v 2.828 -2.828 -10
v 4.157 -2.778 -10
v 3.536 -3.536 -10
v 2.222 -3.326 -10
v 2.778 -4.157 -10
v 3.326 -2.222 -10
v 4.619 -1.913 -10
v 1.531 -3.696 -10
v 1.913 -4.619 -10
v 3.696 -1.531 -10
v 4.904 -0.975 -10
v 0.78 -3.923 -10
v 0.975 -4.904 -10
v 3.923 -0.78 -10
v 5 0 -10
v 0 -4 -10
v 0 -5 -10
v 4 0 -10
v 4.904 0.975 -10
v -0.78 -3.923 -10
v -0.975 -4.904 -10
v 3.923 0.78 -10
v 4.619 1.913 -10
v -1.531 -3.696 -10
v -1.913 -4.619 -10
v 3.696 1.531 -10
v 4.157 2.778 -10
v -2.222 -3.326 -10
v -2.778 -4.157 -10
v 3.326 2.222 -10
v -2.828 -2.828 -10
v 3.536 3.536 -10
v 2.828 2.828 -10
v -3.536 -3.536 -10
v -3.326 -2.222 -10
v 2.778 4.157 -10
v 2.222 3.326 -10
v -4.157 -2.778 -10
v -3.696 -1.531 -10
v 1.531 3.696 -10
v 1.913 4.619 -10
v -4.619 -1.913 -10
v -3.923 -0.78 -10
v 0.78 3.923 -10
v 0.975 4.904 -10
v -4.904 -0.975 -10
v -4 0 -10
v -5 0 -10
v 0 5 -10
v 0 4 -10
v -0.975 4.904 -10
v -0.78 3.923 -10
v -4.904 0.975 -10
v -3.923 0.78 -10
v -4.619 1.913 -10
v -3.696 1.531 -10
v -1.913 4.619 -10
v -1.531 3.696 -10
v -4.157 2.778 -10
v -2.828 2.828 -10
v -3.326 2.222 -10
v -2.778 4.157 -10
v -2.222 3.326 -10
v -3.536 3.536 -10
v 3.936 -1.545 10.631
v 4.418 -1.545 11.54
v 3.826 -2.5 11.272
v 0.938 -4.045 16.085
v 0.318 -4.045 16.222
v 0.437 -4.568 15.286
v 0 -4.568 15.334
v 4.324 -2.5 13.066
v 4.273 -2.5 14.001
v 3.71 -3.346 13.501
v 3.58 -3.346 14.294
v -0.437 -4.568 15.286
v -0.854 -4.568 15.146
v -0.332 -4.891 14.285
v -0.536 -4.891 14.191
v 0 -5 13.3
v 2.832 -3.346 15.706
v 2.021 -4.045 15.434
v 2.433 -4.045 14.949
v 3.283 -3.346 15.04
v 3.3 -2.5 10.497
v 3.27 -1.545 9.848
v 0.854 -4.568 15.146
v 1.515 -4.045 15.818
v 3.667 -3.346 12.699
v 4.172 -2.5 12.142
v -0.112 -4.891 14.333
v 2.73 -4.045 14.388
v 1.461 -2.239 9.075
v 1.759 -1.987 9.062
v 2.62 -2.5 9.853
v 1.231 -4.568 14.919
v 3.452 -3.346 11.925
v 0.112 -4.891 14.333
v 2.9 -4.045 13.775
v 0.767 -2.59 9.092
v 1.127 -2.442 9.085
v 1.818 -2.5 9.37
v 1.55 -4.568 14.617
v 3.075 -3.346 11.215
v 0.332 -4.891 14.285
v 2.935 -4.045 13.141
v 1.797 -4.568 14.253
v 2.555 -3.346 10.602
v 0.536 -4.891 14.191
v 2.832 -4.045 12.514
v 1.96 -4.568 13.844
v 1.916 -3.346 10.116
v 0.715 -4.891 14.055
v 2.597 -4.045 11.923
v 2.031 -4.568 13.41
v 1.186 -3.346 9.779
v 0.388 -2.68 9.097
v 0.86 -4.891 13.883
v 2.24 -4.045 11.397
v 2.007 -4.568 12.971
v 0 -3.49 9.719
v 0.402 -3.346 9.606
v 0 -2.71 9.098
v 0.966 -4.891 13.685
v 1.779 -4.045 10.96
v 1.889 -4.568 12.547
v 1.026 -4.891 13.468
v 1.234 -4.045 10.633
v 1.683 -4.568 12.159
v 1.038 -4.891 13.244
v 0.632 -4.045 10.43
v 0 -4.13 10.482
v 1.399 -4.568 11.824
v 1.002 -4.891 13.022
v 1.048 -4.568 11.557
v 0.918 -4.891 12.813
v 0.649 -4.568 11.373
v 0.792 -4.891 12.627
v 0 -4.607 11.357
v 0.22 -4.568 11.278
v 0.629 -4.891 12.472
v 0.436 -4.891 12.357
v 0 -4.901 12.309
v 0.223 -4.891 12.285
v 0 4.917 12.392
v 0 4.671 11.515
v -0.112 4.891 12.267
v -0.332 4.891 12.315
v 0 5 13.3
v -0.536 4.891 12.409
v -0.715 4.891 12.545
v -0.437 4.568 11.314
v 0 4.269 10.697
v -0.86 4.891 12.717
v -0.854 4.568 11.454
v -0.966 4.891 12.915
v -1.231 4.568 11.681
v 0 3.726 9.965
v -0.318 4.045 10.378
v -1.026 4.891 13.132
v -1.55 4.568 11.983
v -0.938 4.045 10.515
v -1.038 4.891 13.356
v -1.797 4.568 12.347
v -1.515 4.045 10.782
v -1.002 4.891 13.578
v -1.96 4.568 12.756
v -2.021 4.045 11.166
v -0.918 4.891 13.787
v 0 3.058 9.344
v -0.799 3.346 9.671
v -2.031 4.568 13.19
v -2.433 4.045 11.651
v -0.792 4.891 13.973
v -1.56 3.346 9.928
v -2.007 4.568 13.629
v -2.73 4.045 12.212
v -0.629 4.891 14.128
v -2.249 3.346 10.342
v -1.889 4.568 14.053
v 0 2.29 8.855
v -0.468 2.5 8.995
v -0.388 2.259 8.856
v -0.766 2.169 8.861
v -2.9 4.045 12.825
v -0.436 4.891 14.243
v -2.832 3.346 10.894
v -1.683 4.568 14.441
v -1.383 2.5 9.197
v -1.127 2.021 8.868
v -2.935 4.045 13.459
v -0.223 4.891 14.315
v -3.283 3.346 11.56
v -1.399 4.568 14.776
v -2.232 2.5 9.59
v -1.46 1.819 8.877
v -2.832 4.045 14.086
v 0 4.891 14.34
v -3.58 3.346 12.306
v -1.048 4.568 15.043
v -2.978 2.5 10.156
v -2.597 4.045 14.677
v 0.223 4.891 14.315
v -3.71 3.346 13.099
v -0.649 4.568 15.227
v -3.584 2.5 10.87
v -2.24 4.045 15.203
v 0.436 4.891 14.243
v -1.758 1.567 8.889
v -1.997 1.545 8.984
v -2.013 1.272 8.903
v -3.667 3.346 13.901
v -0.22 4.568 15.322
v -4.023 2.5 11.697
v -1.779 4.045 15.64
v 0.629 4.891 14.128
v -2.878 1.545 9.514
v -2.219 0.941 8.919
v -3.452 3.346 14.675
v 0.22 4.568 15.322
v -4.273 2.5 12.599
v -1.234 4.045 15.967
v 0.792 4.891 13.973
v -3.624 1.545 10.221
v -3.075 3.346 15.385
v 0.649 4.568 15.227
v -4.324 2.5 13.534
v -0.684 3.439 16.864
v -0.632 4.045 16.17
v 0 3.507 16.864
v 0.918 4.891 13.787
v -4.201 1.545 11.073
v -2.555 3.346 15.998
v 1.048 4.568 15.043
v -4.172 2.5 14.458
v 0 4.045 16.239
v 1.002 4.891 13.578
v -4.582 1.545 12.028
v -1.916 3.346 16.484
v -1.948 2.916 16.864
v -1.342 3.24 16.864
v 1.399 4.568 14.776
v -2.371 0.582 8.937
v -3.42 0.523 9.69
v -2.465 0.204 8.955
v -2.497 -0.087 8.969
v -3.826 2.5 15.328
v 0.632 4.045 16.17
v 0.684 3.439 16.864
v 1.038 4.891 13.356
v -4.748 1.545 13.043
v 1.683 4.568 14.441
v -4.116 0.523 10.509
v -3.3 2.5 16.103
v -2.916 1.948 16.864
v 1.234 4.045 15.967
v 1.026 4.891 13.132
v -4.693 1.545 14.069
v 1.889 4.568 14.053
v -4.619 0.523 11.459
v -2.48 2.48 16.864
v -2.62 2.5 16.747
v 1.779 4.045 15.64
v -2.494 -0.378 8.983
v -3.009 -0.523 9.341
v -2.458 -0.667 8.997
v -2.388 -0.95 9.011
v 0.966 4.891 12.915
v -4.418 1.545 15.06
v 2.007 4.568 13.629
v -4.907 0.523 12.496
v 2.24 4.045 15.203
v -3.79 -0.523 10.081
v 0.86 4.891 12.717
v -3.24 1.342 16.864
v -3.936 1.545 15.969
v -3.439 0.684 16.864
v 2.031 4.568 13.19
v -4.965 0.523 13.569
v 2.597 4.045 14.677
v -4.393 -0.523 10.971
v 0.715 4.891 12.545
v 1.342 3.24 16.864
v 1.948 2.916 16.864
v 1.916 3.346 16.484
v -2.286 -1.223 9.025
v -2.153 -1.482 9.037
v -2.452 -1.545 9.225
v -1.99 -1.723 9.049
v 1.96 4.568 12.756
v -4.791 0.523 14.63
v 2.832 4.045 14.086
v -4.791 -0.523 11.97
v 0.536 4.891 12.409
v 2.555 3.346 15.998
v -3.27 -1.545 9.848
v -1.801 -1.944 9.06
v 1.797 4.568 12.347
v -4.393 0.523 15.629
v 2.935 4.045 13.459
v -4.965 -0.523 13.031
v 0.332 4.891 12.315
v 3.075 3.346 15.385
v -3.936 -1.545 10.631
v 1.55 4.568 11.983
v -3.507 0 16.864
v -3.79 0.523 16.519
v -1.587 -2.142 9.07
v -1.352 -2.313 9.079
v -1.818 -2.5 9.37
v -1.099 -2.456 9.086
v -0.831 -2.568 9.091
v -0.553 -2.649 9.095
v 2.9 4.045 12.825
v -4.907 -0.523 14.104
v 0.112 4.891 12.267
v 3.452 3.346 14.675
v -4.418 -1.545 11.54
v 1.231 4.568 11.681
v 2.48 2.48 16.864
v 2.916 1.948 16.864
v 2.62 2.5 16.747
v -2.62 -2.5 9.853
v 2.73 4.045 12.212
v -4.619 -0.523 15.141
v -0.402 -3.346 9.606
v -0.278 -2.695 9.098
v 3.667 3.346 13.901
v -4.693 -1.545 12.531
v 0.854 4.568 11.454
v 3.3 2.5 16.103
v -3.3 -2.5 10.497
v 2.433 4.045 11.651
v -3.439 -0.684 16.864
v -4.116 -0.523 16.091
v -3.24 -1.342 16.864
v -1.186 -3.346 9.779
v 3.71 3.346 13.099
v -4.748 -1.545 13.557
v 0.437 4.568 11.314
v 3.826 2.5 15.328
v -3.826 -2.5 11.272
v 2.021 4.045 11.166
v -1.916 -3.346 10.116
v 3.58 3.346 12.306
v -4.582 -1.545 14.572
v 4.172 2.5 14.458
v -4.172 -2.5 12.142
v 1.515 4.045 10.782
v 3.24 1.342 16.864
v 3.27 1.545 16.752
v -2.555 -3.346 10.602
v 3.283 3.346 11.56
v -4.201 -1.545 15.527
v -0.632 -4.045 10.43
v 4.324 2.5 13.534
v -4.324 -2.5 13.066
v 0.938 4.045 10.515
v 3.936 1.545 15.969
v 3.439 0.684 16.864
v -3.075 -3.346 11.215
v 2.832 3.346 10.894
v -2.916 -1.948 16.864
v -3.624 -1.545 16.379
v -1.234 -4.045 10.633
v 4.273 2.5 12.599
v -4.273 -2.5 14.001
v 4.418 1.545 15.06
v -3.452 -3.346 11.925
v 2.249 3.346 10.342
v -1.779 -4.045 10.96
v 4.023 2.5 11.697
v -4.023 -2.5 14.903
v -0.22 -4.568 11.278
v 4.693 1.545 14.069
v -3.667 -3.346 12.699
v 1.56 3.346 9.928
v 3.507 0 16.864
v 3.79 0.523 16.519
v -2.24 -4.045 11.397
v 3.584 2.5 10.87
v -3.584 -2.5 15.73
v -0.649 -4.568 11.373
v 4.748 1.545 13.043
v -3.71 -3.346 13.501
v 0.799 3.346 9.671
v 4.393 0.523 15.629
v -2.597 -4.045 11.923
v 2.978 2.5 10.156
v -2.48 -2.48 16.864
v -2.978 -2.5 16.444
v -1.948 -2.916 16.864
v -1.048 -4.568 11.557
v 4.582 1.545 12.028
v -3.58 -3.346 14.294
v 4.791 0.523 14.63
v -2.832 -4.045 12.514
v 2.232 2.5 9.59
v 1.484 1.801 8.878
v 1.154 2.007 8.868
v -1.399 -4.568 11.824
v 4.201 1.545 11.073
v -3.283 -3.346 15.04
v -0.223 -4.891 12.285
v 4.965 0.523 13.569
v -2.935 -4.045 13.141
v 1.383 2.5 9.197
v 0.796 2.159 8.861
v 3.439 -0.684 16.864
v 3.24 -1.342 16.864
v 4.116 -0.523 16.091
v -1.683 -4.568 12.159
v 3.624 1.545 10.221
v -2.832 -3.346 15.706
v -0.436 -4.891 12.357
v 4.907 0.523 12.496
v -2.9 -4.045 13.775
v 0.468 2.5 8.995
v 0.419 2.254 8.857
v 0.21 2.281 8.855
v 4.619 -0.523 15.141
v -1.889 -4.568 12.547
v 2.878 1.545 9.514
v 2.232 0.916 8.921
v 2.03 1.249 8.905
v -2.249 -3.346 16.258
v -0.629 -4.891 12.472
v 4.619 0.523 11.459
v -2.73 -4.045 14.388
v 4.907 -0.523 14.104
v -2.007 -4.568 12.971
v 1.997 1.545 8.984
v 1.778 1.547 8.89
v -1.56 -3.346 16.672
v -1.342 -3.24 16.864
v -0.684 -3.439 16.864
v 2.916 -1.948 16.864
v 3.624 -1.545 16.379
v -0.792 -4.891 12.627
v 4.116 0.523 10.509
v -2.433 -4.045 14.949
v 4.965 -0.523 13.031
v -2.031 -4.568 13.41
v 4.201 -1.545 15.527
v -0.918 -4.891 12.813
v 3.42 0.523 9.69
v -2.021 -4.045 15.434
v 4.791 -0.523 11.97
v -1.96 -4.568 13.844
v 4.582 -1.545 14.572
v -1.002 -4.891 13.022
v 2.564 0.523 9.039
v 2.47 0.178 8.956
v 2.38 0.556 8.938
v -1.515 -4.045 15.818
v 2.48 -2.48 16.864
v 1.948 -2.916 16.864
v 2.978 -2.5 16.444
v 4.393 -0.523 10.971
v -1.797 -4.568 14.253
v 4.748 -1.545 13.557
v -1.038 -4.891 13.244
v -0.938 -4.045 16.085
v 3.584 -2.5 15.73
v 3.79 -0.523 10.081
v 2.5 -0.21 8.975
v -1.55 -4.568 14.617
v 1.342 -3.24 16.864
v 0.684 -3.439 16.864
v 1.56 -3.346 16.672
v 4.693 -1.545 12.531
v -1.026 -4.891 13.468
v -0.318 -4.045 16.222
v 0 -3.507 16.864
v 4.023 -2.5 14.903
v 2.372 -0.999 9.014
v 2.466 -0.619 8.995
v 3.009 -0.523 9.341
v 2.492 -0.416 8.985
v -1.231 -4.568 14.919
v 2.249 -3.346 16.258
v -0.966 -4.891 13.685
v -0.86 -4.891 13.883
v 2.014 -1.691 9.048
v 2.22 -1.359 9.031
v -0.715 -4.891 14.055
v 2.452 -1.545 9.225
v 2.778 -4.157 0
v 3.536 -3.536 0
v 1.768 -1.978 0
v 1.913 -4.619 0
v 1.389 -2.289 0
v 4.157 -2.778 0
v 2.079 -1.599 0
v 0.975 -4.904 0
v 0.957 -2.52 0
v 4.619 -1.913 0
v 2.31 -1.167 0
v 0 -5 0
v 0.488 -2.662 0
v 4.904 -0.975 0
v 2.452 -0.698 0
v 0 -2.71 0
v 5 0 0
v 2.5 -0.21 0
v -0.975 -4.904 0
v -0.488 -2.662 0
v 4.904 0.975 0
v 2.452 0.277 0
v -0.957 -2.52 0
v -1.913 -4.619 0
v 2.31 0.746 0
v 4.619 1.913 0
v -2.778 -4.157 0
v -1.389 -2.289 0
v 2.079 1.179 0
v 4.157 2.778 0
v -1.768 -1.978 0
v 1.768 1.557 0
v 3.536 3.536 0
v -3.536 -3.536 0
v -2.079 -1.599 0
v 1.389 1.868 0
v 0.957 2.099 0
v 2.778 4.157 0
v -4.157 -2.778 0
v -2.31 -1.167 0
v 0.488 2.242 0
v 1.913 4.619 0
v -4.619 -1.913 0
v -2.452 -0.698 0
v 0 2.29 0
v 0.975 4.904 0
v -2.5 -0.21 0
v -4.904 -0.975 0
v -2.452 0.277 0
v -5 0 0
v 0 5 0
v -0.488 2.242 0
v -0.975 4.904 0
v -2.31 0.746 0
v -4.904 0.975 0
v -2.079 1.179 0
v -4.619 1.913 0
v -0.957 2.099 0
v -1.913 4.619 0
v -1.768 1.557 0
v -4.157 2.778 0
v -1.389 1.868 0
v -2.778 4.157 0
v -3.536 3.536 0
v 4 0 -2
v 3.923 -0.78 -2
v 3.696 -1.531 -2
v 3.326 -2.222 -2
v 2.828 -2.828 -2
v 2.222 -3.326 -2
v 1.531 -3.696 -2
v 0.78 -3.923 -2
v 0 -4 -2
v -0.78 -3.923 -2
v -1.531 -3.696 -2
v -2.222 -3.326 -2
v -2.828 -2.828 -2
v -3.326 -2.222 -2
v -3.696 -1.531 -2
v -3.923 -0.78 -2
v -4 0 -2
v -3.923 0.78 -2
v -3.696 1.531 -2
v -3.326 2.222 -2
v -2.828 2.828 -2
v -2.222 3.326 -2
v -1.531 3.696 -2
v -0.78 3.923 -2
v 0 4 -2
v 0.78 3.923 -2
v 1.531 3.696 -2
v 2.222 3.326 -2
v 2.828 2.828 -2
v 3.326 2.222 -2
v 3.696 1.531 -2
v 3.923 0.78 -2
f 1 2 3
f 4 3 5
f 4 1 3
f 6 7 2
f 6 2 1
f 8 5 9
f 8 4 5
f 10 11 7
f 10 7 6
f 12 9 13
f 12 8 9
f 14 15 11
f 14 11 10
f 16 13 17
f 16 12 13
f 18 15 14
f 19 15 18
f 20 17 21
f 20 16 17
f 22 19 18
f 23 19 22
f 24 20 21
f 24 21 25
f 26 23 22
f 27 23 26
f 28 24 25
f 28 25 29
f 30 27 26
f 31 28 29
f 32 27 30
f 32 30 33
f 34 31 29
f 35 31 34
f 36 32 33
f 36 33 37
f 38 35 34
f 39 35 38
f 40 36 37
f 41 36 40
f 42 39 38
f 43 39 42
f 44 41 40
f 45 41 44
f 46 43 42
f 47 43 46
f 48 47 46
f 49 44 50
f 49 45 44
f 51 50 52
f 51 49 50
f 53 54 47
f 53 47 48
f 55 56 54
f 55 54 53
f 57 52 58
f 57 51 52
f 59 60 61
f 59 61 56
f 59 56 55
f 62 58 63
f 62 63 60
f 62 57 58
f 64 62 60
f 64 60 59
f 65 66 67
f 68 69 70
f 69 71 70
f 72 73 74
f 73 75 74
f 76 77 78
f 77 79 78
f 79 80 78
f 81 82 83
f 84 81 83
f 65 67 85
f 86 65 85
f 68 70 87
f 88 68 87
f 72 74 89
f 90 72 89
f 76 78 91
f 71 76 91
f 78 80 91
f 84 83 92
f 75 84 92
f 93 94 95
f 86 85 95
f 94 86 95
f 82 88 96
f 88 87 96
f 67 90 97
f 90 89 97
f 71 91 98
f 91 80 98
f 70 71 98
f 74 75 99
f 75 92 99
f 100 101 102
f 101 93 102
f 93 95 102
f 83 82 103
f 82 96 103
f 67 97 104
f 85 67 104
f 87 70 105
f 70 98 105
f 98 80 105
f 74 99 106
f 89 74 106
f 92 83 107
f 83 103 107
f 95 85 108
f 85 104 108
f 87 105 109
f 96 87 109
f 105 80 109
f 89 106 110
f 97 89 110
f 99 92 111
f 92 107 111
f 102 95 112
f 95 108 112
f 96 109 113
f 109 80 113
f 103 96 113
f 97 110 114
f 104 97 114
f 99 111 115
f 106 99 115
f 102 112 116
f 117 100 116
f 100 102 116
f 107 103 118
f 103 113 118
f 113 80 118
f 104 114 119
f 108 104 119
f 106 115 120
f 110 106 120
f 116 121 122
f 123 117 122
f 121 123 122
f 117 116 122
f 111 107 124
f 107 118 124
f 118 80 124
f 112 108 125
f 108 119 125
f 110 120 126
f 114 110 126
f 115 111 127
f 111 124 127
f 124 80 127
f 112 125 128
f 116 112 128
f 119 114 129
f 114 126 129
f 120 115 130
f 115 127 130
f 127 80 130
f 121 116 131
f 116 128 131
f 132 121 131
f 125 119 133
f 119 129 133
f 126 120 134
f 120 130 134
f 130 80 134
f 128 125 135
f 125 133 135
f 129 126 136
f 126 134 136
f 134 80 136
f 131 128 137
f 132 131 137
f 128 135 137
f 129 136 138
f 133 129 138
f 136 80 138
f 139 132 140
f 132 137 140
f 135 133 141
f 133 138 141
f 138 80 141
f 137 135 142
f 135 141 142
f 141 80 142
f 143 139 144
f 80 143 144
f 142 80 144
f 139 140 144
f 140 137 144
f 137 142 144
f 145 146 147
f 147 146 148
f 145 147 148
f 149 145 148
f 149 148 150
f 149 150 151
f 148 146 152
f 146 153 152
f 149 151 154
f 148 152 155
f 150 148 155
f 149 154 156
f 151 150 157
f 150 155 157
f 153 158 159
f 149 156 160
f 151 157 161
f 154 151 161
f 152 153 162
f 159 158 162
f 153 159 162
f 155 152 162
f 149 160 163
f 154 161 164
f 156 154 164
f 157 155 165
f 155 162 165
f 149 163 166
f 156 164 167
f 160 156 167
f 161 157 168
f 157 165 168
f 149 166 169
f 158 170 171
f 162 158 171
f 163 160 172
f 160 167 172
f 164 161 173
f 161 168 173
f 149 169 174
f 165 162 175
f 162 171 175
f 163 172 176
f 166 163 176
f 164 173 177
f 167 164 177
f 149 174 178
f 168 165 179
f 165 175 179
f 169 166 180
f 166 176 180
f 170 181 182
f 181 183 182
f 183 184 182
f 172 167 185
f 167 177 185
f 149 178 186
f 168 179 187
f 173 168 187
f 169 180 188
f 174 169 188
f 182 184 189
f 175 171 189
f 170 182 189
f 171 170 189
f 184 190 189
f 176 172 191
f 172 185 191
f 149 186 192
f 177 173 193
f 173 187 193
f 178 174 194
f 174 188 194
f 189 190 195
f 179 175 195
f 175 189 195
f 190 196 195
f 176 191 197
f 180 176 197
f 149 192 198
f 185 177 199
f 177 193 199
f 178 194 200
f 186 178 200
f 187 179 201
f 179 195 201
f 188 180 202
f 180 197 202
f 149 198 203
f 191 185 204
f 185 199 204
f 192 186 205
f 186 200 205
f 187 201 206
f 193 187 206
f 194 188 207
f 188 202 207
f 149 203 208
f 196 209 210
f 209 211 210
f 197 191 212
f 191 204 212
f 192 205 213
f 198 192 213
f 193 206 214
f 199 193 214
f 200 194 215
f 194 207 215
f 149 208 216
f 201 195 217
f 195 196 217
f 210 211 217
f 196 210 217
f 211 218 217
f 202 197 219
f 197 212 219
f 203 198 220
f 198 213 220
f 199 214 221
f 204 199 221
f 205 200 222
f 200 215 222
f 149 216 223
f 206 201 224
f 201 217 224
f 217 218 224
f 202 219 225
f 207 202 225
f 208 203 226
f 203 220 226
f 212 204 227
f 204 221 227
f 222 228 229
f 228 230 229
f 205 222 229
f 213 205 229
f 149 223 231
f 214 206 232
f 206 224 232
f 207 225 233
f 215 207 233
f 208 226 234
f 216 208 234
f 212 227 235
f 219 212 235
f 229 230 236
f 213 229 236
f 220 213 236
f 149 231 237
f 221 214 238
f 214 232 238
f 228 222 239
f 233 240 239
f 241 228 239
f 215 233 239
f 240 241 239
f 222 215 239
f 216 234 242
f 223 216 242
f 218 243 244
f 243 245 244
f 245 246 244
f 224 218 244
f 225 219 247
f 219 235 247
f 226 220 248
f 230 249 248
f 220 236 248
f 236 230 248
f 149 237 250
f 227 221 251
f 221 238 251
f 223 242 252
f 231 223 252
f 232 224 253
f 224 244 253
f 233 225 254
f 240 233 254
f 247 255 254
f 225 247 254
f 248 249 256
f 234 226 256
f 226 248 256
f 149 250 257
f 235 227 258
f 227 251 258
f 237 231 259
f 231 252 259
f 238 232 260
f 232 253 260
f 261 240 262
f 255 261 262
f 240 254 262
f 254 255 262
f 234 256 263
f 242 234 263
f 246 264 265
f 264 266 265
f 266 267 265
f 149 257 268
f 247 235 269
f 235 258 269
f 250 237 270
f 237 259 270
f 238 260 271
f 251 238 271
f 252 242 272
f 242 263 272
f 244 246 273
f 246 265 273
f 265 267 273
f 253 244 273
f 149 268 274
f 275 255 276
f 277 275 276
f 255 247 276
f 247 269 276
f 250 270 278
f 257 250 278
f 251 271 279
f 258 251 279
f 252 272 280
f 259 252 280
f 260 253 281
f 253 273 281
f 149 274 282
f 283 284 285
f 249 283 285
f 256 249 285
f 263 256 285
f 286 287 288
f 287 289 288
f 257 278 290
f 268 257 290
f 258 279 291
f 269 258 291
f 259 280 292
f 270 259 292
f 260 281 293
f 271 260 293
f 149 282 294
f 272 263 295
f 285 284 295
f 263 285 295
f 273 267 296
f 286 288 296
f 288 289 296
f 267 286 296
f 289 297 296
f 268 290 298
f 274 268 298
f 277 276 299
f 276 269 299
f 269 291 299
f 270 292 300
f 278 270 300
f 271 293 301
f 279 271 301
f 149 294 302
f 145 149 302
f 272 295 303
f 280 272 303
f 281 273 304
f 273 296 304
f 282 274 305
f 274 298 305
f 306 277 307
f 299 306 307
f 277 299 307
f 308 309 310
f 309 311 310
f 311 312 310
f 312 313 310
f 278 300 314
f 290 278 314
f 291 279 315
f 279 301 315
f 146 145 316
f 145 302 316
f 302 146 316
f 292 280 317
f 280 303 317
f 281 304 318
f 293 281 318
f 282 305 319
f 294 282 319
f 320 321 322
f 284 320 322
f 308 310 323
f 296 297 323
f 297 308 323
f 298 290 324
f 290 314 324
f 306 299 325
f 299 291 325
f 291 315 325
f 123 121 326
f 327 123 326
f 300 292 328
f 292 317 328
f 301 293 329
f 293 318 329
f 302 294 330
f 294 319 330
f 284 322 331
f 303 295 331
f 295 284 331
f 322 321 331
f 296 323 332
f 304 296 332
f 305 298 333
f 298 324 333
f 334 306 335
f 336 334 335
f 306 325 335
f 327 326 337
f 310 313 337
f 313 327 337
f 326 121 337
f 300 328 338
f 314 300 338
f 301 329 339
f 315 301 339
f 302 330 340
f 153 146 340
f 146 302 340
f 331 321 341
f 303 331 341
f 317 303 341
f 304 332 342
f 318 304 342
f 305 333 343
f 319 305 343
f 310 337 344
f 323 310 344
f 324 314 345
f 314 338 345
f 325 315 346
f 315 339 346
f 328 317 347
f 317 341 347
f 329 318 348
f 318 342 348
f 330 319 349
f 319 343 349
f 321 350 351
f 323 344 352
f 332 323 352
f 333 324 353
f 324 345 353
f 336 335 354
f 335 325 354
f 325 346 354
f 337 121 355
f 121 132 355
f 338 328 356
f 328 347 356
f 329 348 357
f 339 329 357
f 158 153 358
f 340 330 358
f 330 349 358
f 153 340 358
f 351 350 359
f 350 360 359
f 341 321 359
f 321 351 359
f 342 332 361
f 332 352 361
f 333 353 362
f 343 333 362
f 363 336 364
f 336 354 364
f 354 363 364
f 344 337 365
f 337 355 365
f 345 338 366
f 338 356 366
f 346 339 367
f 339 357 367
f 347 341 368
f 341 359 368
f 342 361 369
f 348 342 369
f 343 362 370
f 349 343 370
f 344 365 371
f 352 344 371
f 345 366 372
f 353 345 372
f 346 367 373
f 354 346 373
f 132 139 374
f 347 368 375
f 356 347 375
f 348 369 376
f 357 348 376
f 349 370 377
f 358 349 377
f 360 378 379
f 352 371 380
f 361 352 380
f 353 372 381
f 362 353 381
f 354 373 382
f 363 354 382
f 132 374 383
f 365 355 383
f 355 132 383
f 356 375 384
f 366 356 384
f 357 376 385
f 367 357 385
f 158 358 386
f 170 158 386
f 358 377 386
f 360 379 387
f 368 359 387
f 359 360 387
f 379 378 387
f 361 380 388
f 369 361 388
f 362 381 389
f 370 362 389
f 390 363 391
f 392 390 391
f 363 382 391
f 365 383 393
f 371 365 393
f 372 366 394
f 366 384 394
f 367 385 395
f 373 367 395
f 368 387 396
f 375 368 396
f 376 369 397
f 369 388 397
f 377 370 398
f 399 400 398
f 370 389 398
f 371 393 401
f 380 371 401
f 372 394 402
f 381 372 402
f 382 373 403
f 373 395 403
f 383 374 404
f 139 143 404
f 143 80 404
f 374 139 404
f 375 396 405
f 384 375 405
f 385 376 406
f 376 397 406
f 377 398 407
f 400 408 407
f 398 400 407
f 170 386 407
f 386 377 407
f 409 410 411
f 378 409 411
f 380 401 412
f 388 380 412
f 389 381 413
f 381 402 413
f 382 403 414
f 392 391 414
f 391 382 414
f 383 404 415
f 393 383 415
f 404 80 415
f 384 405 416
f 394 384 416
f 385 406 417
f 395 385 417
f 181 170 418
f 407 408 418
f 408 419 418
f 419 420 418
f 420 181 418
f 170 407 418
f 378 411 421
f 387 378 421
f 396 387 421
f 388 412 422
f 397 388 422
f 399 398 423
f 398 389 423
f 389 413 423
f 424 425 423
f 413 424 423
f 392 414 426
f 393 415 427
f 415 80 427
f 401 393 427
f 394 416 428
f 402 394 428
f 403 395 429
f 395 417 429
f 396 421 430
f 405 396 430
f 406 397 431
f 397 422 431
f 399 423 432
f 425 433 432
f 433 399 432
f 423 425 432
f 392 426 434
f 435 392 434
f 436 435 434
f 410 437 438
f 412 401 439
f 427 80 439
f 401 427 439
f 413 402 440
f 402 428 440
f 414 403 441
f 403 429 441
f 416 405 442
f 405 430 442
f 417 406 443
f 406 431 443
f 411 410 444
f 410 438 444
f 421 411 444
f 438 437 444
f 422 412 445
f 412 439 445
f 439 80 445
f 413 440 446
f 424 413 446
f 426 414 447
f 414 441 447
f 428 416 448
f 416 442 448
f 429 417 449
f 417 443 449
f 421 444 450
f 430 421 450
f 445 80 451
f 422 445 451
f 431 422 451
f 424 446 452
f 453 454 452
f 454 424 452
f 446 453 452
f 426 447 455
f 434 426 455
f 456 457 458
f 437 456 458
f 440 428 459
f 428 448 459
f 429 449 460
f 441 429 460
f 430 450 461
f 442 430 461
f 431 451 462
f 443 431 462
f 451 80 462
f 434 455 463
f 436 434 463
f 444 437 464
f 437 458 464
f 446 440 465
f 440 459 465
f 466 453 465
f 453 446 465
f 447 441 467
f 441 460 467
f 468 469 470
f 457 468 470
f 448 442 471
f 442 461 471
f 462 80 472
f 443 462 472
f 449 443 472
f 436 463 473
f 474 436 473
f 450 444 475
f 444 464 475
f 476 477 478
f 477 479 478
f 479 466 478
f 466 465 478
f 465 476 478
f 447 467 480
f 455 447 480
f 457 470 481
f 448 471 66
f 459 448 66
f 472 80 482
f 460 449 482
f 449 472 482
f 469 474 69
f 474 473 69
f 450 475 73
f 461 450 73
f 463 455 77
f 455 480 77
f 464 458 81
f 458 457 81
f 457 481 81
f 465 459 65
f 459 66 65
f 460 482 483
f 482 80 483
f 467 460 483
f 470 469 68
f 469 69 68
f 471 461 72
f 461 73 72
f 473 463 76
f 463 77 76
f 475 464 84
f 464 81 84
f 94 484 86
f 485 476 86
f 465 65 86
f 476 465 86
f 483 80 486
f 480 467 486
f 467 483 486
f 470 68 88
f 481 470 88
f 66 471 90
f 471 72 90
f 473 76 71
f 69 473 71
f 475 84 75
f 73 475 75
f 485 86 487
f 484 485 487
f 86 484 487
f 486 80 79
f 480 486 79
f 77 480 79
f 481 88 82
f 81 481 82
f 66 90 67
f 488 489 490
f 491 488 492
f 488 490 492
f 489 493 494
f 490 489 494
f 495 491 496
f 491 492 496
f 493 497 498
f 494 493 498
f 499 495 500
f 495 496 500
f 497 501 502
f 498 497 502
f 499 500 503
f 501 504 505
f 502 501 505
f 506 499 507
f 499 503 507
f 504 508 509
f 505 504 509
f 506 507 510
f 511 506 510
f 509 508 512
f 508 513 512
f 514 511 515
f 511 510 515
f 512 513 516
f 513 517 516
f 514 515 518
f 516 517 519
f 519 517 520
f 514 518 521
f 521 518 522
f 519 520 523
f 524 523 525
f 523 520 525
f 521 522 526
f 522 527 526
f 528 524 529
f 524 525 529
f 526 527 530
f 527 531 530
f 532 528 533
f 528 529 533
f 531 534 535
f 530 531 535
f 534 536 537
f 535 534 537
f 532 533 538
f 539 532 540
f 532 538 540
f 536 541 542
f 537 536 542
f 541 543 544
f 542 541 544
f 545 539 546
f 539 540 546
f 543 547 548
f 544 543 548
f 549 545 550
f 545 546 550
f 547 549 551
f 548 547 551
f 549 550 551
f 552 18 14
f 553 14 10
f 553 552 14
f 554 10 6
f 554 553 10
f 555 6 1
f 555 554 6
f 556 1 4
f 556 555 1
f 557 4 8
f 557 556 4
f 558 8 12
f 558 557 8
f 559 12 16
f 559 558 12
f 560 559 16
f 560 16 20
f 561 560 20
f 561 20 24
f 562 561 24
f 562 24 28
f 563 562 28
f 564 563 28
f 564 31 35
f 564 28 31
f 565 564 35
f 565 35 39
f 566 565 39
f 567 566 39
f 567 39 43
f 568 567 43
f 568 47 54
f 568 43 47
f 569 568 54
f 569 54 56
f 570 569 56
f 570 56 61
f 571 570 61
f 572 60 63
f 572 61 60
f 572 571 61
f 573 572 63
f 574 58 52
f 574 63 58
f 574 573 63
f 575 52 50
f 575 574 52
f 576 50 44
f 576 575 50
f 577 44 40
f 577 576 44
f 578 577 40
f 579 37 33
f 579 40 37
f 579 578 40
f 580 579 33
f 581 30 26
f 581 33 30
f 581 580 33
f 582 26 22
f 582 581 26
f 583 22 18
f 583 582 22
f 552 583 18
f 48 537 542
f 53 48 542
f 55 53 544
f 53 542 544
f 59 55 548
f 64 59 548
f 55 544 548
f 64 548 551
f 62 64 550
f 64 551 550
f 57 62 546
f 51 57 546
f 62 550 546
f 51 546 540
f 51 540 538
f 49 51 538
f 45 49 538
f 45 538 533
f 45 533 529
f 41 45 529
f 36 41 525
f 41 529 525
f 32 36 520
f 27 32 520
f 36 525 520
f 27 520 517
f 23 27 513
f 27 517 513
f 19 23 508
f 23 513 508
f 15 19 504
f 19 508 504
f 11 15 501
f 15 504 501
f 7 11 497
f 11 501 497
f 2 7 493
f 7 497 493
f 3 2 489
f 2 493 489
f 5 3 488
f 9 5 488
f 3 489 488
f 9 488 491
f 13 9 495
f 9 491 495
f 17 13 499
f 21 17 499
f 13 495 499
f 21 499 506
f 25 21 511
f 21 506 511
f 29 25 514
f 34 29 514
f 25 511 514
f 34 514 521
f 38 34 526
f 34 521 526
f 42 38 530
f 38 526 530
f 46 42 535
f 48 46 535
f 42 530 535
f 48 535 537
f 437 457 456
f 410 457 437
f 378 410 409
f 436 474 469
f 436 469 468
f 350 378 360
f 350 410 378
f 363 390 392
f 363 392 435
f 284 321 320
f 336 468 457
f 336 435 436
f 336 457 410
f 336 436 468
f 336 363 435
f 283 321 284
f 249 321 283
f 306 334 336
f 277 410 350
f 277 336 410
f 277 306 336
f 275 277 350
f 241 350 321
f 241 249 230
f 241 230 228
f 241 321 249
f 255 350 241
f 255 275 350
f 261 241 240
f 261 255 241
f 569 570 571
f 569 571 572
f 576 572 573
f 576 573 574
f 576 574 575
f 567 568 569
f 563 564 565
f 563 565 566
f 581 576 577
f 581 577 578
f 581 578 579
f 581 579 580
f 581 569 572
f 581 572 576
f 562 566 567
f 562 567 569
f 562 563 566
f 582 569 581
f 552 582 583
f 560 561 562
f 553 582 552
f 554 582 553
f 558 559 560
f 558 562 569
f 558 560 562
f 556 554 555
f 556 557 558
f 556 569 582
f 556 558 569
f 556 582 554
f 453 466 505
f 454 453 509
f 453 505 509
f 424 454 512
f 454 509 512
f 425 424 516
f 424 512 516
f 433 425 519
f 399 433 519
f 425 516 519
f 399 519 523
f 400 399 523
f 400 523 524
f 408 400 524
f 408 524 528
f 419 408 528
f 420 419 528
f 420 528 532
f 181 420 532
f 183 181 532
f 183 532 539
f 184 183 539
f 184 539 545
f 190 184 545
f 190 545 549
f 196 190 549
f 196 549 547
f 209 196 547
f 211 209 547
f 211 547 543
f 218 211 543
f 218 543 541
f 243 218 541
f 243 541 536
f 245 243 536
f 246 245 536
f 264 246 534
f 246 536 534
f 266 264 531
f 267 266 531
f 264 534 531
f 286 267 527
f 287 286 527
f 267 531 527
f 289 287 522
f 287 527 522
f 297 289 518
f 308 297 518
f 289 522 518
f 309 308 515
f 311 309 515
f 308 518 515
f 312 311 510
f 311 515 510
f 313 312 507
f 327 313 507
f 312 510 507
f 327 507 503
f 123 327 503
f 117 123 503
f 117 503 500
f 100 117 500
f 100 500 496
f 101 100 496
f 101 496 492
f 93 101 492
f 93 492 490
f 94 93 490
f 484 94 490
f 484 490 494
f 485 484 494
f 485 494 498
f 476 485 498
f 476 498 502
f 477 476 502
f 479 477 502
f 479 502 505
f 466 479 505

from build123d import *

# Parameters (mm, degrees)
SKETCH1_R               = 2.5
BOSS_EXTRUDE1_DEPTH     = 9.1
CUT_EXTRUDE1_DEPTH      = 20.618613611
CUT_EXTRUDE1_DEPTH_BACK = 20.618613611
SKETCH4_W               = 5.29751814
SKETCH4_H               = 11.035514004
SKETCH5_R               = 5
BOSS_EXTRUDE2_DEPTH     = 10
CUT_EXTRUDE2_DEPTH      = 28.779051493
CUT_EXTRUDE2_DEPTH_BACK = 8
SKETCH6_R               = 4


with BuildPart() as part:
    # Sketch1 → Boss-Extrude1 (new body)
    with BuildSketch(Plane.XY):
        with Locations((0, -0.210420065)):
            Circle(SKETCH1_R)
    extrude(amount=BOSS_EXTRUDE1_DEPTH)

    # Sketch3 → Revolve1 (revolve)
    with BuildSketch(Plane(origin=(0, 0, 0), x_dir=(0, 0, -1), z_dir=(1, 0, 0))):
        with BuildLine():
            Line((-13.3, -5), (-13.3, 5))
            ThreePointArc((-13.3, 5), (-8.3, 0), (-13.3, -5))
        make_face()
    revolve(axis=Axis((0, -5, 13.3), (0, 1, 0)))

    # Sketch4 → Cut-Extrude1 (cut, two sides: drawn at the far end of the back side and taken through both)
    with BuildSketch(Plane(origin=(0, 0, 0), x_dir=(0, 0, -1), z_dir=(1, 0, 0)).offset(-CUT_EXTRUDE1_DEPTH_BACK)):
        with Locations((-19.512781414, 0.215959178)):
            Rectangle(SKETCH4_W, SKETCH4_H)
    extrude(amount=CUT_EXTRUDE1_DEPTH + CUT_EXTRUDE1_DEPTH_BACK, mode=Mode.SUBTRACT)

    # Sketch5 → Boss-Extrude2 (add)
    with BuildSketch(Plane(origin=(0, 0, 0), x_dir=(-1, 0, 0), z_dir=(0, 0, -1))):
        Circle(SKETCH5_R)
    extrude(amount=BOSS_EXTRUDE2_DEPTH)

    # Sketch6 → Cut-Extrude2 (cut, two sides: drawn at the far end of the back side and taken through both)
    with BuildSketch(Plane(origin=(0, 0, -10), x_dir=(-1, 0, 0), z_dir=(0, 0, -1)).offset(-CUT_EXTRUDE2_DEPTH_BACK)):
        with Locations(Location((0, 0, 0), (0, 0, 180))):
            Circle(SKETCH6_R)
    extrude(amount=CUT_EXTRUDE2_DEPTH + CUT_EXTRUDE2_DEPTH_BACK, mode=Mode.SUBTRACT)


solid = part.part
